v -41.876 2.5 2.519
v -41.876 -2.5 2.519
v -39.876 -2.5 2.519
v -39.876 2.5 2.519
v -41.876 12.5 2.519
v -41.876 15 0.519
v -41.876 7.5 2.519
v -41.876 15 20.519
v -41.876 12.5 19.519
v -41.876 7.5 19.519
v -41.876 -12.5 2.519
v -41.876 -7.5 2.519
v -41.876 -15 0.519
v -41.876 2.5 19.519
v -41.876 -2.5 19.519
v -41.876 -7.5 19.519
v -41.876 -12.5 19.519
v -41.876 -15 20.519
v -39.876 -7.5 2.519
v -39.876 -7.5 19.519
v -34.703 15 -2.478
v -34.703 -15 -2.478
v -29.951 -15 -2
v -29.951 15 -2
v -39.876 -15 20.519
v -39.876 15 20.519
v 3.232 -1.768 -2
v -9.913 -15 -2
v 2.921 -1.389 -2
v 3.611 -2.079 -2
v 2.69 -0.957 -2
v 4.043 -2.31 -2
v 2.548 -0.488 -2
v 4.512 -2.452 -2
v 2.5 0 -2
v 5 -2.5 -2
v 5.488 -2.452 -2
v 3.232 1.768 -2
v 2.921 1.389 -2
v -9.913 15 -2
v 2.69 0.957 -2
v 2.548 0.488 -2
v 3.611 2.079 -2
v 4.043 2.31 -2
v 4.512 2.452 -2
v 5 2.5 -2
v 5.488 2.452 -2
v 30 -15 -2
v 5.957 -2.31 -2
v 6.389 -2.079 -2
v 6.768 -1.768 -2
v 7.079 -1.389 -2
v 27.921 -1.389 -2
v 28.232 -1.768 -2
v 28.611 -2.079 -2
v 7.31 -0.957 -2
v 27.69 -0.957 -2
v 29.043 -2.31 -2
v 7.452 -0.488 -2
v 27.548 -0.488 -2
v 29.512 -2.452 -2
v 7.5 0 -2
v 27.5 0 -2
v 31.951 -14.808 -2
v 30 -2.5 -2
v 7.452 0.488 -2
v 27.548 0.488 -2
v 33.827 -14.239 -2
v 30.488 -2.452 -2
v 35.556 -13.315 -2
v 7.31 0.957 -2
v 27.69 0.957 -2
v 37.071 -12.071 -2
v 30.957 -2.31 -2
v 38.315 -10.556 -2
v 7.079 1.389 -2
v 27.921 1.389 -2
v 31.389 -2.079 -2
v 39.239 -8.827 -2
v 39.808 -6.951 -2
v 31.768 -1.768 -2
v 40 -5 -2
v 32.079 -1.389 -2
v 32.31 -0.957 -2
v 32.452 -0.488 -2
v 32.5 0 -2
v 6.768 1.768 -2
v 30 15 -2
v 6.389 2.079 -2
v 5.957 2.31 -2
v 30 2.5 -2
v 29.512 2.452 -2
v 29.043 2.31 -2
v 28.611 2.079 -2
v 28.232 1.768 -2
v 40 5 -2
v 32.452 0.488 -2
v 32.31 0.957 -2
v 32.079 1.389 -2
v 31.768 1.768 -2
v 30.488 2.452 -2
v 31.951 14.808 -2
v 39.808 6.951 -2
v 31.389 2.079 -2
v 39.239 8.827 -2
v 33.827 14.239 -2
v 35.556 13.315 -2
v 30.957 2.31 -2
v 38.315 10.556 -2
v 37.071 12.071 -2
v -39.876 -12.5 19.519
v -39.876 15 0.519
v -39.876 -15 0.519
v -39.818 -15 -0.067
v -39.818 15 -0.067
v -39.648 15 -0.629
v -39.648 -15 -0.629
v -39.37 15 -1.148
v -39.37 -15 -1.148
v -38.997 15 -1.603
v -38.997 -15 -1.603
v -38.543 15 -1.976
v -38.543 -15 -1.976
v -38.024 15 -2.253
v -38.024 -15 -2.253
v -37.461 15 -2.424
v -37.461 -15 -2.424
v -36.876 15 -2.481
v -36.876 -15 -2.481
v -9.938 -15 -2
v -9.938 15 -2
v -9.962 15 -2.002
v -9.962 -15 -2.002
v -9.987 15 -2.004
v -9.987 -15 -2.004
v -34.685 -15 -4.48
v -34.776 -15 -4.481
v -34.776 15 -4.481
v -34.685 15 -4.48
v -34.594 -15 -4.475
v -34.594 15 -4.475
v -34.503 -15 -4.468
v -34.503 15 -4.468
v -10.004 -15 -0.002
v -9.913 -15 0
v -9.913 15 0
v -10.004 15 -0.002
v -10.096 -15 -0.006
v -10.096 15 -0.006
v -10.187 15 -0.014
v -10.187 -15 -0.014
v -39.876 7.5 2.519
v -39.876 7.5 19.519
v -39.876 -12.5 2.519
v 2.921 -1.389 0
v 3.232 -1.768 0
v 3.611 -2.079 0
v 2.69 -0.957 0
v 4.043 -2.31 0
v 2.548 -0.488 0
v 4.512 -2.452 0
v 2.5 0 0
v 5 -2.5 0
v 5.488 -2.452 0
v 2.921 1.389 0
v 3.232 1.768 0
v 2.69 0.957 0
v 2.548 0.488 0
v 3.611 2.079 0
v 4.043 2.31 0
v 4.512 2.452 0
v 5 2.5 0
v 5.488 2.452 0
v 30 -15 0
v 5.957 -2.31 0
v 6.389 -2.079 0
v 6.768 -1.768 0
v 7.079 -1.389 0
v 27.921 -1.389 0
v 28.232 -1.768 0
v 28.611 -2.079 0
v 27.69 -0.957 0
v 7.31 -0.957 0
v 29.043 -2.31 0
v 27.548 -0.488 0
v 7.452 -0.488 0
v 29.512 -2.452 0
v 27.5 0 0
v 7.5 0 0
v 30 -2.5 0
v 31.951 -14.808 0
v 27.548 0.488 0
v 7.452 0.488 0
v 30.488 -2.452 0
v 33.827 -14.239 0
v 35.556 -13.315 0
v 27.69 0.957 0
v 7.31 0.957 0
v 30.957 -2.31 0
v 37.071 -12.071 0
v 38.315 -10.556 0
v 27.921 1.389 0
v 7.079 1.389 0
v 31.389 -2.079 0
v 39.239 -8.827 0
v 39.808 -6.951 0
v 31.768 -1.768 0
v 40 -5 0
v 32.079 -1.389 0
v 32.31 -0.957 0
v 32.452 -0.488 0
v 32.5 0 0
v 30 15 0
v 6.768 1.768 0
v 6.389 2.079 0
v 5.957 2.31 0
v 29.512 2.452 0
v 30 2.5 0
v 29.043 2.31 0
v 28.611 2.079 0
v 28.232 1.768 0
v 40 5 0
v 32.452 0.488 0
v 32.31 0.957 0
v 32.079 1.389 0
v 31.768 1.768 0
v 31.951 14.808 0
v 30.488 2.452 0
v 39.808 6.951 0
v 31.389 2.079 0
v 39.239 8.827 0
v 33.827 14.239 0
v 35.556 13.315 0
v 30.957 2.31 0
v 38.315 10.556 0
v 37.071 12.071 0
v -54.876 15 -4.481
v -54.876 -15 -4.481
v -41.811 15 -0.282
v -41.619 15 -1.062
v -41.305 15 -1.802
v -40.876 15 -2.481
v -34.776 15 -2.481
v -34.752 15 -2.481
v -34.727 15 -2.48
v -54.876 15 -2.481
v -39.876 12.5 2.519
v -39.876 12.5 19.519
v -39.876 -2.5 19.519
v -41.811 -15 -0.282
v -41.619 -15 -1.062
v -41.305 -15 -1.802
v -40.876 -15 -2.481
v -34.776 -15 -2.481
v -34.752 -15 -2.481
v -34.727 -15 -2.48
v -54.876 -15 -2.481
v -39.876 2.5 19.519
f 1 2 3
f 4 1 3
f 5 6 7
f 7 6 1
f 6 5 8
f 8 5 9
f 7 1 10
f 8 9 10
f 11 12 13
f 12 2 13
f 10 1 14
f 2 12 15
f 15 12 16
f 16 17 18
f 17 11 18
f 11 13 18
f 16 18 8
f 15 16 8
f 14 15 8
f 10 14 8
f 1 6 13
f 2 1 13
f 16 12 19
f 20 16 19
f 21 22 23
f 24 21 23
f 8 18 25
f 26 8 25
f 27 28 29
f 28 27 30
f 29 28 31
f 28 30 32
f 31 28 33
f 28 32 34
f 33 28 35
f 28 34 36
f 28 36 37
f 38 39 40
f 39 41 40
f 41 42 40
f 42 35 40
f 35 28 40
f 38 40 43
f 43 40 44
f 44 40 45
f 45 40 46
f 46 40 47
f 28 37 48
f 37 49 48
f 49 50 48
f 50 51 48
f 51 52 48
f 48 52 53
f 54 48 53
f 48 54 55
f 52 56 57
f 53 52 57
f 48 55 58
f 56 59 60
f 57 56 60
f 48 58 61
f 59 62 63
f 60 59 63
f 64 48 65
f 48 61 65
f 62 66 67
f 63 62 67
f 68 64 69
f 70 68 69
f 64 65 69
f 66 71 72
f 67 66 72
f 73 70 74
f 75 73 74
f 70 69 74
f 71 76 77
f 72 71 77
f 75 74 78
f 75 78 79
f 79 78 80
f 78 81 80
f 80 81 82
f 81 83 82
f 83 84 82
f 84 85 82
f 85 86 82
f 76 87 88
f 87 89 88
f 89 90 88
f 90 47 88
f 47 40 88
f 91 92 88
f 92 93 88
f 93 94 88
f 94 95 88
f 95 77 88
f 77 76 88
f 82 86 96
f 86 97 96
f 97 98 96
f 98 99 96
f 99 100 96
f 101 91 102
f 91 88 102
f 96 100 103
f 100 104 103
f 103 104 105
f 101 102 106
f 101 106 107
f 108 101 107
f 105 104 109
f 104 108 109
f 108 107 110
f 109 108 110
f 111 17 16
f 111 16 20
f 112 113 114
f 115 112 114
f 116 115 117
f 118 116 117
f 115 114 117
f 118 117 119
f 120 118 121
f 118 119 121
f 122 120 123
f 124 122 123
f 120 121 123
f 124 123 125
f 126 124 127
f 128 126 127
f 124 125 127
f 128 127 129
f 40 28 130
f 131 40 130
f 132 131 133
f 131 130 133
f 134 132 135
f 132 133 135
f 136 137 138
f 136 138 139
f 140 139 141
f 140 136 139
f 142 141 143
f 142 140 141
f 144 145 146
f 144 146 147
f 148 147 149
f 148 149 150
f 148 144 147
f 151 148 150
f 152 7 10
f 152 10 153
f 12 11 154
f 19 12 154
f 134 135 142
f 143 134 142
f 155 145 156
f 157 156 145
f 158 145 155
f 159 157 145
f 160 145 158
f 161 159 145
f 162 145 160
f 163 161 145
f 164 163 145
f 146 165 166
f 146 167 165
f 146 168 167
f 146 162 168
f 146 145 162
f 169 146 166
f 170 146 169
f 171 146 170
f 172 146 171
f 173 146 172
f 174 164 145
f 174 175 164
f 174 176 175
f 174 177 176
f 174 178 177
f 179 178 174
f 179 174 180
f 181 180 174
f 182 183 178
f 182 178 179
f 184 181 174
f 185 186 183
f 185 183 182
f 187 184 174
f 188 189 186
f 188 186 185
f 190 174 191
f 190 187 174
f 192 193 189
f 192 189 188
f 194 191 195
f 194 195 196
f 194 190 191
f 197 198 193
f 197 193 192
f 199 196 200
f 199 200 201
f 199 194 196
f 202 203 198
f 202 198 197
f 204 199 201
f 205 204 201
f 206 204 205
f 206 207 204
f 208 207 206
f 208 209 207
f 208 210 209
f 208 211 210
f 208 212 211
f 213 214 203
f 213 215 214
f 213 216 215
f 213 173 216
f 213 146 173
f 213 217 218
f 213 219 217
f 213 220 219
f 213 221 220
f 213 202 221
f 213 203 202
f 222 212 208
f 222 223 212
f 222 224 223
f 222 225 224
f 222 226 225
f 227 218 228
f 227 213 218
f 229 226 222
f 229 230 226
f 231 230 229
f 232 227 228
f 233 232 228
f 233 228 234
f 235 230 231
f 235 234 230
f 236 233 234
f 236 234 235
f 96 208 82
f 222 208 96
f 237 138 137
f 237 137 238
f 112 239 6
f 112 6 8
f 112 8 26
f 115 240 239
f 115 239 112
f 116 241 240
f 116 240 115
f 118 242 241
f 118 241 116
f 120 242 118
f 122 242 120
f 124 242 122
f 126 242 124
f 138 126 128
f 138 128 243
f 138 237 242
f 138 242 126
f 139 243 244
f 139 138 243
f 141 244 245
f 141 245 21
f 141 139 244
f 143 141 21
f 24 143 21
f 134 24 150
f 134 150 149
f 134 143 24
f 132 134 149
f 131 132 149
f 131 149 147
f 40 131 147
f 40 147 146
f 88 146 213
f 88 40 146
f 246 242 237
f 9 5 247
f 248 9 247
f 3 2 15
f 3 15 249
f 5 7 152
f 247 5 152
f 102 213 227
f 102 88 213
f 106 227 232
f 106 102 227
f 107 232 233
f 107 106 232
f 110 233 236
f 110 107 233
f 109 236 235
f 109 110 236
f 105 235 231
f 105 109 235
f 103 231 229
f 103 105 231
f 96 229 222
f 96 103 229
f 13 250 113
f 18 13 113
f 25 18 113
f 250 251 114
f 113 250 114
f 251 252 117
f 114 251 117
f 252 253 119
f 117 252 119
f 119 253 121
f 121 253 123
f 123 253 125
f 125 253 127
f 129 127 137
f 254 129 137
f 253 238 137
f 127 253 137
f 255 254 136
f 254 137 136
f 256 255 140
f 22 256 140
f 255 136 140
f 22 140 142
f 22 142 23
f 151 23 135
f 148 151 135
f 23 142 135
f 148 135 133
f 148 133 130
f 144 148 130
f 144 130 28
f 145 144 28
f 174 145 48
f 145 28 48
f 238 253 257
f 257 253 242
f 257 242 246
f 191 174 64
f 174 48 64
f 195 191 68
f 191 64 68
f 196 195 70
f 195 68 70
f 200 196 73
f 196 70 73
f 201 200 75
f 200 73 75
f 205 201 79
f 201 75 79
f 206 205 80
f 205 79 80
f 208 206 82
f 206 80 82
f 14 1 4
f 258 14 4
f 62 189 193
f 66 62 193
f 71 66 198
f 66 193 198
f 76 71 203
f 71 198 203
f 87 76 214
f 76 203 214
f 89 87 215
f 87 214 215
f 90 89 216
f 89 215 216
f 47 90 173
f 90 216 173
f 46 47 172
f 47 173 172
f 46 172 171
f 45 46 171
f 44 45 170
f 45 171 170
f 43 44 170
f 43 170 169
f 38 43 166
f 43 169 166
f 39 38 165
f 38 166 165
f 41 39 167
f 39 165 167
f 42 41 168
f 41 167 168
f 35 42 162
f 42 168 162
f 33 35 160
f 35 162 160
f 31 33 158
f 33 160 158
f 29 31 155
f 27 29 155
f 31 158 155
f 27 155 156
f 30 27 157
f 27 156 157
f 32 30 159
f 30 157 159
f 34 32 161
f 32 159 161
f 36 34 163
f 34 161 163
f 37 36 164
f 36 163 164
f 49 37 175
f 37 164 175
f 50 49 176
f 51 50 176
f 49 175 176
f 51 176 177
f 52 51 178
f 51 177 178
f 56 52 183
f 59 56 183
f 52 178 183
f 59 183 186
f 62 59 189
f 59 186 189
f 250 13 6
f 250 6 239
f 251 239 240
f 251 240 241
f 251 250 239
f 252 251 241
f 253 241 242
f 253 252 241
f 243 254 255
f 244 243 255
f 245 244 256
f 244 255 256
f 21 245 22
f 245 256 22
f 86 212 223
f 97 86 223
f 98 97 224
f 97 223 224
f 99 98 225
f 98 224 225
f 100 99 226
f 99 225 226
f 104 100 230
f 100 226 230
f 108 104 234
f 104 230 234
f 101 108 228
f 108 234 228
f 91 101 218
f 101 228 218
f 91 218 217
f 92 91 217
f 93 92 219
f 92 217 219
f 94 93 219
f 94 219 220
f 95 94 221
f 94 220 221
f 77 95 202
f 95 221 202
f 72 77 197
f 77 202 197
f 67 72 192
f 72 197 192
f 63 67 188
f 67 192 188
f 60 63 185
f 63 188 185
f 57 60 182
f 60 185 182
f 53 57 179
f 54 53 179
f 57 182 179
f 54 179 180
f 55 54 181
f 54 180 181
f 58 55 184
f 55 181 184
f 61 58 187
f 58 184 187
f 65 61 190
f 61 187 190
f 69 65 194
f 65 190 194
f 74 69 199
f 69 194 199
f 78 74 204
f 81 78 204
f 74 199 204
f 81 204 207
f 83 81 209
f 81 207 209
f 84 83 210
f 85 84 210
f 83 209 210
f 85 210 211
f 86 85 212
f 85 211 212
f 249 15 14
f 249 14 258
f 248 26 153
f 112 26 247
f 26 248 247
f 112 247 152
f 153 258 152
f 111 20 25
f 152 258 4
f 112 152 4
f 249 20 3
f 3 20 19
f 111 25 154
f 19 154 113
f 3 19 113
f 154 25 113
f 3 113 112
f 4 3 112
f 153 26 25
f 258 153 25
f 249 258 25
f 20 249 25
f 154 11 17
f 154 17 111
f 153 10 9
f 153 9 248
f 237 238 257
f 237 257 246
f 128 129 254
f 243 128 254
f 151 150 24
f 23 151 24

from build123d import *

# Parameters (mm, degrees)
SKETCH1_W                    = 80
SKETCH1_H                    = 30
SKETCH1_R                    = 2.5
BASE_FLANGE1_DEPTH           = 2
FILLET1_R                    = 10
EDGE_FLANGE1_STRIP_W         = 14
EDGE_FLANGE1_STRIP_H         = 2
EDGE_FLANGE1_STRIP_CUT_DEPTH = 30
EDGE_FLANGE1_DEPTH           = 30
SKETCH9_W                    = 17
SKETCH9_H                    = 5
CUT_EXTRUDE1_DEPTH           = 10
SKETCHED_START               = -15
SKETCHED_BEND1_DEPTH         = 30
SKETCHED_START_2             = -12.5
SKETCHED_BEND1_2_DEPTH       = 5
SKETCHED_START_3             = -2.5
SKETCHED_BEND1_3_DEPTH       = 5
SKETCHED_START_4             = 7.5
SKETCHED_BEND1_4_DEPTH       = 5
SKETCHED_BEND1_5_DEPTH       = 30
SKETCHED_START_5             = -7.5
SKETCHED_BEND1_6_DEPTH       = 5
SKETCHED_START_6             = 2.5
SKETCHED_BEND1_7_DEPTH       = 5
SKETCHED_BEND1_8_DEPTH       = 2.5
SKETCHED_START_7             = 12.5
SKETCHED_BEND1_9_DEPTH       = 2.5
SKETCHED_BEND4_DEPTH         = 30
SKETCHED_BEND4_2_OUTLINE_W   = 2
SKETCHED_BEND4_2_OUTLINE_H   = 1
SKETCHED_BEND4_2_DEPTH       = 30
SKETCHED_BEND4_3_DEPTH       = 5
SKETCHED_BEND4_4_DEPTH       = 5
SKETCHED_BEND4_5_DEPTH       = 2.5
SKETCHED_BEND4_6_DEPTH       = 2.5
SKETCH18_W                   = 18
SKETCH18_H                   = 30
BOSS_EXTRUDE2_DEPTH          = 2


# Read off the part's stored shape, not the designer's step: Sketched Bend1, Sketched Bend4
# Sheet-metal steps are written as plain solids
with BuildPart() as part:
    # Sketch1 → Base-Flange1 (new body)
    with BuildSketch(Plane.XY):
        Rectangle(SKETCH1_W, SKETCH1_H)
        with Locations((30, 0)):
            Circle(SKETCH1_R, mode=Mode.SUBTRACT)
        with Locations((5, 0)):
            Circle(SKETCH1_R, mode=Mode.SUBTRACT)
    extrude(amount=-BASE_FLANGE1_DEPTH)

    # Fillet1
    fillet1_edges = [part.edges().sort_by_distance(p)[0] for p in [
        (40, -15, -1),
        (40, 15, -1),
    ]]
    fillet(fillet1_edges, radius=FILLET1_R)

    # Edge-Flange1 strip (across the edge) → Edge-Flange1 strip cut (cut)
    with BuildSketch(Plane(origin=(-40, 15, 0), x_dir=(1, 0, 0), z_dir=(0, -1, 0))):
        with Locations((-4, -1)):
            Rectangle(EDGE_FLANGE1_STRIP_W, EDGE_FLANGE1_STRIP_H)
    extrude(amount=EDGE_FLANGE1_STRIP_CUT_DEPTH, mode=Mode.SUBTRACT)

    # Edge-Flange1 section (across the edge) → Edge-Flange1 (add)
    with BuildSketch(Plane(origin=(-40, 15, 0), x_dir=(1, 0, 0), z_dir=(0, -1, 0))):
        with BuildLine():
            Line((-2, 3), (-2, 23))
            Line((-2, 23), (0, 23))
            Line((0, 23), (0, 3))
            ThreePointArc((0, 3), (0.878679656, 0.878679656), (3, 0))
            Line((3, 0), (3, -2))
            ThreePointArc((3, -2), (-0.535533906, -0.535533906), (-2, 3))
        make_face()
    extrude(amount=EDGE_FLANGE1_DEPTH)

    # Sketch9 → Cut-Extrude1 (cut)
    with BuildSketch(Plane.ZY.offset(42)):
        with Locations((13.5, 10)):
            Rectangle(SKETCH9_W, SKETCH9_H)
        with Locations((13.5, 0)):
            Rectangle(SKETCH9_W, SKETCH9_H)
        with Locations((13.5, -10)):
            Rectangle(SKETCH9_W, SKETCH9_H)
    extrude(amount=-CUT_EXTRUDE1_DEPTH, mode=Mode.SUBTRACT)

    # Sketched Bend1 outline → Sketched Bend1 (cut)
    with BuildSketch(Plane(origin=(0, 0, 0), x_dir=(1, 0, 0), z_dir=(0, 1, 0)).offset(SKETCHED_START)):
        with BuildLine():
            Line((-10.18667911, 0.013716565), (-29.950540767, 2))
            Line((-29.950540767, 2), (-37, 2))
            ThreePointArc((-37, 2), (-38.560982046, 1.750087899), (-39.965920771, 1.025334021))
            ThreePointArc((-39.965920771, 1.025334021), (-40.15194126, 0.535100989), (-40.24976541, 0.019967526))
            Line((-40.24976541, 0.019967526), (-42, -17.395167538))
            Line((-42, -17.395167538), (-42, -23))
            Line((-42, -23), (-40, -23))
            Line((-40, -23), (-40, -3))
            ThreePointArc((-40, -3), (-39.121320344, -0.878679656), (-37, 0))
            Line((-37, 0), (-9.913027212, 0))
            ThreePointArc((-9.913027212, 0), (-10.050024936, 0.003431293), (-10.18667911, 0.013716565))
        make_face()
    extrude(amount=SKETCHED_BEND1_DEPTH, mode=Mode.SUBTRACT)

    # Sketched Bend1 2 outline → Sketched Bend1 2 (cut)
    with BuildSketch(Plane(origin=(0, 0, 0), x_dir=(1, 0, 0), z_dir=(0, 1, 0)).offset(SKETCHED_START_2)):
        with BuildLine():
            Line((-40.449759489, -1.970007943), (-41.860749959, -1.828202306))
            ThreePointArc((-41.860749959, -1.828202306), (-41.965065447, -2.409978727), (-42, -3))
            Line((-42, -3), (-42, -5))
            Line((-42, -5), (-40.754276042, -5))
            Line((-40.754276042, -5), (-40.449759489, -1.970007943))
        make_face()
    extrude(amount=SKETCHED_BEND1_2_DEPTH, mode=Mode.SUBTRACT)

    # Sketched Bend1 3 outline → Sketched Bend1 3 (cut)
    with BuildSketch(Plane(origin=(0, 0, 0), x_dir=(1, 0, 0), z_dir=(0, 1, 0)).offset(SKETCHED_START_3)):
        with BuildLine():
            Line((-40.449759489, -1.970007943), (-41.860749959, -1.828202306))
            ThreePointArc((-41.860749959, -1.828202306), (-41.965065447, -2.409978727), (-42, -3))
            Line((-42, -3), (-42, -5))
            Line((-42, -5), (-40.754276042, -5))
            Line((-40.754276042, -5), (-40.449759489, -1.970007943))
        make_face()
    extrude(amount=SKETCHED_BEND1_3_DEPTH, mode=Mode.SUBTRACT)

    # Sketched Bend1 4 outline → Sketched Bend1 4 (cut)
    with BuildSketch(Plane(origin=(0, 0, 0), x_dir=(1, 0, 0), z_dir=(0, 1, 0)).offset(SKETCHED_START_4)):
        with BuildLine():
            Line((-40.449759489, -1.970007943), (-41.860749959, -1.828202306))
            ThreePointArc((-41.860749959, -1.828202306), (-41.965065447, -2.409978727), (-42, -3))
            Line((-42, -3), (-42, -5))
            Line((-42, -5), (-40.754276042, -5))
            Line((-40.754276042, -5), (-40.449759489, -1.970007943))
        make_face()
    extrude(amount=SKETCHED_BEND1_4_DEPTH, mode=Mode.SUBTRACT)

    # Sketched Bend1 5 outline → Sketched Bend1 5 (add)
    with BuildSketch(Plane(origin=(0, 0, 0), x_dir=(1, 0, 0), z_dir=(0, 1, 0)).offset(SKETCHED_START)):
        with BuildLine():
            Line((-9.986685031, 2.003692035), (-36.764817009, 4.69491508))
            ThreePointArc((-36.764817009, 4.69491508), (-40.429072155, 3.591332203), (-42.23974088, 0.219961605))
            Line((-42.23974088, 0.219961605), (-42.439734959, -1.770013864))
            Line((-42.439734959, -1.770013864), (-41.860749959, -1.828202306))
            ThreePointArc((-41.860749959, -1.828202306), (-41.165316443, -0.234111548), (-39.965920771, 1.025334021))
            ThreePointArc((-39.965920771, 1.025334021), (-38.729937691, 2.33787213), (-36.964811088, 2.704939611))
            Line((-36.964811088, 2.704939611), (-29.950540767, 2))
            Line((-29.950540767, 2), (-9.913027212, 2))
            ThreePointArc((-9.913027212, 2), (-9.949902357, 2.000923588), (-9.986685031, 2.003692035))
        make_face()
        Polygon((-42.149709161, -18.884799432), (-44.139684631, -18.684805353), (-44.23968167, -19.679793088), (-42.249706201, -19.879787167), align=None)
    extrude(amount=SKETCHED_BEND1_5_DEPTH)

    # Sketched Bend1 6 outline → Sketched Bend1 6 (add)
    with BuildSketch(Plane(origin=(0, 0, 0), x_dir=(1, 0, 0), z_dir=(0, 1, 0)).offset(SKETCHED_START_5)):
        with BuildLine():
            Line((-41.860749959, -1.828202306), (-42.439734959, -1.770013864))
            Line((-42.439734959, -1.770013864), (-44.13968463, -18.684805353))
            Line((-44.13968463, -18.684805353), (-42.149709161, -18.884799432))
            Line((-42.149709161, -18.884799432), (-42, -17.395167538))
            Line((-42, -17.395167538), (-42, -3))
            ThreePointArc((-42, -3), (-41.965065447, -2.409978727), (-41.860749959, -1.828202306))
        make_face()
    extrude(amount=SKETCHED_BEND1_6_DEPTH)

    # Sketched Bend1 7 outline → Sketched Bend1 7 (add)
    with BuildSketch(Plane(origin=(0, 0, 0), x_dir=(1, 0, 0), z_dir=(0, 1, 0)).offset(SKETCHED_START_6)):
        with BuildLine():
            Line((-41.860749959, -1.828202306), (-42.439734959, -1.770013864))
            Line((-42.439734959, -1.770013864), (-44.13968463, -18.684805353))
            Line((-44.13968463, -18.684805353), (-42.149709161, -18.884799432))
            Line((-42.149709161, -18.884799432), (-42, -17.395167538))
            Line((-42, -17.395167538), (-42, -3))
            ThreePointArc((-42, -3), (-41.965065447, -2.409978727), (-41.860749959, -1.828202306))
        make_face()
    extrude(amount=SKETCHED_BEND1_7_DEPTH)

    # Sketched Bend1 8 outline → Sketched Bend1 8 (add)
    with BuildSketch(Plane(origin=(0, 0, 0), x_dir=(1, 0, 0), z_dir=(0, 1, 0)).offset(SKETCHED_START)):
        with BuildLine():
            Line((-41.860749959, -1.828202306), (-42.439734959, -1.770013864))
            Line((-42.439734959, -1.770013864), (-44.13968463, -18.684805353))
            Line((-44.13968463, -18.684805353), (-42.149709161, -18.884799432))
            Line((-42.149709161, -18.884799432), (-42, -17.395167538))
            Line((-42, -17.395167538), (-42, -3))
            ThreePointArc((-42, -3), (-41.965065447, -2.409978727), (-41.860749959, -1.828202306))
        make_face()
    extrude(amount=SKETCHED_BEND1_8_DEPTH)

    # Sketched Bend1 9 outline → Sketched Bend1 9 (add)
    with BuildSketch(Plane(origin=(0, 0, 0), x_dir=(1, 0, 0), z_dir=(0, 1, 0)).offset(SKETCHED_START_7)):
        with BuildLine():
            Line((-41.860749959, -1.828202306), (-42.439734959, -1.770013864))
            Line((-42.439734959, -1.770013864), (-44.13968463, -18.684805353))
            Line((-44.13968463, -18.684805353), (-42.149709161, -18.884799432))
            Line((-42.149709161, -18.884799432), (-42, -17.395167538))
            Line((-42, -17.395167538), (-42, -3))
            ThreePointArc((-42, -3), (-41.965065447, -2.409978727), (-41.860749959, -1.828202306))
        make_face()
    extrude(amount=SKETCHED_BEND1_9_DEPTH)

    # Sketched Bend4 outline → Sketched Bend4 (cut)
    with BuildSketch(Plane(origin=(0, 0, 0), x_dir=(1, 0, 0), z_dir=(0, 1, 0)).offset(SKETCHED_START)):
        with BuildLine():
            Line((-41.875919477, -16.160545003), (-41.875919477, -0.518726813))
            ThreePointArc((-41.875919477, -0.518726813), (-40.411453383, 3.016807093), (-36.875919477, 4.481273187))
            Line((-36.875919477, 4.481273187), (-34.776213155, 4.481273187))
            ThreePointArc((-34.776213155, 4.481273187), (-34.639215431, 4.477841895), (-34.502561257, 4.467556622))
            Line((-34.502561257, 4.467556622), (-36.764817009, 4.69491508))
            ThreePointArc((-36.764817009, 4.69491508), (-40.429072155, 3.591332203), (-42.23974088, 0.219961605))
            Line((-42.23974088, 0.219961605), (-44.23968167, -19.679793088))
            Line((-44.23968167, -19.679793088), (-42.249706201, -19.879787167))
            Line((-42.249706201, -19.879787167), (-41.875919477, -16.160545003))
        make_face()
    extrude(amount=SKETCHED_BEND4_DEPTH, mode=Mode.SUBTRACT)

    # Sketched Bend4 2 outline → Sketched Bend4 2 (add)
    with BuildSketch(Plane(origin=(0, 0, 0), x_dir=(1, 0, 0), z_dir=(0, 1, 0)).offset(SKETCHED_START)):
        with BuildLine():
            ThreePointArc((-39.875919477, -0.518726813), (-38.997239821, 1.602593531), (-36.875919477, 2.481273187))
            Line((-36.875919477, 2.481273187), (-34.776213155, 2.481273187))
            ThreePointArc((-34.776213155, 2.481273187), (-34.73933801, 2.480349599), (-34.702555336, 2.477581152))
            Line((-34.702555336, 2.477581152), (-36.964811088, 2.704939611))
            ThreePointArc((-36.964811088, 2.704939611), (-39.163364175, 2.042789885), (-40.24976541, 0.019967526))
            Line((-40.24976541, 0.019967526), (-40.449759489, -1.970007943))
            Line((-40.449759489, -1.970007943), (-41.875919477, -1.826677757))
            Line((-41.875919477, -1.826677757), (-41.875919477, -2.518726813))
            Line((-41.875919477, -2.518726813), (-39.875919477, -2.518726813))
            Line((-39.875919477, -2.518726813), (-39.875919477, -0.518726813))
        make_face()
        with Locations((-40.875919477, -20.018726813)):
            Rectangle(SKETCHED_BEND4_2_OUTLINE_W, SKETCHED_BEND4_2_OUTLINE_H)
    extrude(amount=SKETCHED_BEND4_2_DEPTH)

    # Sketched Bend4 3 outline → Sketched Bend4 3 (add)
    with BuildSketch(Plane(origin=(0, 0, 0), x_dir=(1, 0, 0), z_dir=(0, 1, 0)).offset(SKETCHED_START_5)):
        Polygon((-39.875919477, -19.518726813), (-39.875919477, -2.518726813), (-40.504906161, -2.518726813), (-41.875919477, -16.160545003), (-41.875919477, -19.518726813), align=None)
    extrude(amount=SKETCHED_BEND4_3_DEPTH)

    # Sketched Bend4 4 outline → Sketched Bend4 4 (add)
    with BuildSketch(Plane(origin=(0, 0, 0), x_dir=(1, 0, 0), z_dir=(0, 1, 0)).offset(SKETCHED_START_6)):
        Polygon((-39.875919477, -19.518726813), (-39.875919477, -2.518726813), (-40.504906161, -2.518726813), (-41.875919477, -16.160545003), (-41.875919477, -19.518726813), align=None)
    extrude(amount=SKETCHED_BEND4_4_DEPTH)

    # Sketched Bend4 5 outline → Sketched Bend4 5 (add)
    with BuildSketch(Plane(origin=(0, 0, 0), x_dir=(1, 0, 0), z_dir=(0, 1, 0)).offset(SKETCHED_START)):
        Polygon((-39.875919477, -19.518726813), (-39.875919477, -2.518726813), (-40.504906161, -2.518726813), (-41.875919477, -16.160545003), (-41.875919477, -19.518726813), align=None)
    extrude(amount=SKETCHED_BEND4_5_DEPTH)

    # Sketched Bend4 6 outline → Sketched Bend4 6 (add)
    with BuildSketch(Plane(origin=(0, 0, 0), x_dir=(1, 0, 0), z_dir=(0, 1, 0)).offset(SKETCHED_START_7)):
        Polygon((-39.875919477, -19.518726813), (-39.875919477, -2.518726813), (-40.504906161, -2.518726813), (-41.875919477, -16.160545003), (-41.875919477, -19.518726813), align=None)
    extrude(amount=SKETCHED_BEND4_6_DEPTH)

    # Sketch18 → Boss-Extrude2 (add)
    with BuildSketch(Plane(origin=(0, 0, -4.481273187), x_dir=(-1, 0, 0), z_dir=(0, 0, -1))):
        with Locations((45.875919477, 0)):
            Rectangle(SKETCH18_W, SKETCH18_H)
    extrude(amount=-BOSS_EXTRUDE2_DEPTH)


solid = part.part
